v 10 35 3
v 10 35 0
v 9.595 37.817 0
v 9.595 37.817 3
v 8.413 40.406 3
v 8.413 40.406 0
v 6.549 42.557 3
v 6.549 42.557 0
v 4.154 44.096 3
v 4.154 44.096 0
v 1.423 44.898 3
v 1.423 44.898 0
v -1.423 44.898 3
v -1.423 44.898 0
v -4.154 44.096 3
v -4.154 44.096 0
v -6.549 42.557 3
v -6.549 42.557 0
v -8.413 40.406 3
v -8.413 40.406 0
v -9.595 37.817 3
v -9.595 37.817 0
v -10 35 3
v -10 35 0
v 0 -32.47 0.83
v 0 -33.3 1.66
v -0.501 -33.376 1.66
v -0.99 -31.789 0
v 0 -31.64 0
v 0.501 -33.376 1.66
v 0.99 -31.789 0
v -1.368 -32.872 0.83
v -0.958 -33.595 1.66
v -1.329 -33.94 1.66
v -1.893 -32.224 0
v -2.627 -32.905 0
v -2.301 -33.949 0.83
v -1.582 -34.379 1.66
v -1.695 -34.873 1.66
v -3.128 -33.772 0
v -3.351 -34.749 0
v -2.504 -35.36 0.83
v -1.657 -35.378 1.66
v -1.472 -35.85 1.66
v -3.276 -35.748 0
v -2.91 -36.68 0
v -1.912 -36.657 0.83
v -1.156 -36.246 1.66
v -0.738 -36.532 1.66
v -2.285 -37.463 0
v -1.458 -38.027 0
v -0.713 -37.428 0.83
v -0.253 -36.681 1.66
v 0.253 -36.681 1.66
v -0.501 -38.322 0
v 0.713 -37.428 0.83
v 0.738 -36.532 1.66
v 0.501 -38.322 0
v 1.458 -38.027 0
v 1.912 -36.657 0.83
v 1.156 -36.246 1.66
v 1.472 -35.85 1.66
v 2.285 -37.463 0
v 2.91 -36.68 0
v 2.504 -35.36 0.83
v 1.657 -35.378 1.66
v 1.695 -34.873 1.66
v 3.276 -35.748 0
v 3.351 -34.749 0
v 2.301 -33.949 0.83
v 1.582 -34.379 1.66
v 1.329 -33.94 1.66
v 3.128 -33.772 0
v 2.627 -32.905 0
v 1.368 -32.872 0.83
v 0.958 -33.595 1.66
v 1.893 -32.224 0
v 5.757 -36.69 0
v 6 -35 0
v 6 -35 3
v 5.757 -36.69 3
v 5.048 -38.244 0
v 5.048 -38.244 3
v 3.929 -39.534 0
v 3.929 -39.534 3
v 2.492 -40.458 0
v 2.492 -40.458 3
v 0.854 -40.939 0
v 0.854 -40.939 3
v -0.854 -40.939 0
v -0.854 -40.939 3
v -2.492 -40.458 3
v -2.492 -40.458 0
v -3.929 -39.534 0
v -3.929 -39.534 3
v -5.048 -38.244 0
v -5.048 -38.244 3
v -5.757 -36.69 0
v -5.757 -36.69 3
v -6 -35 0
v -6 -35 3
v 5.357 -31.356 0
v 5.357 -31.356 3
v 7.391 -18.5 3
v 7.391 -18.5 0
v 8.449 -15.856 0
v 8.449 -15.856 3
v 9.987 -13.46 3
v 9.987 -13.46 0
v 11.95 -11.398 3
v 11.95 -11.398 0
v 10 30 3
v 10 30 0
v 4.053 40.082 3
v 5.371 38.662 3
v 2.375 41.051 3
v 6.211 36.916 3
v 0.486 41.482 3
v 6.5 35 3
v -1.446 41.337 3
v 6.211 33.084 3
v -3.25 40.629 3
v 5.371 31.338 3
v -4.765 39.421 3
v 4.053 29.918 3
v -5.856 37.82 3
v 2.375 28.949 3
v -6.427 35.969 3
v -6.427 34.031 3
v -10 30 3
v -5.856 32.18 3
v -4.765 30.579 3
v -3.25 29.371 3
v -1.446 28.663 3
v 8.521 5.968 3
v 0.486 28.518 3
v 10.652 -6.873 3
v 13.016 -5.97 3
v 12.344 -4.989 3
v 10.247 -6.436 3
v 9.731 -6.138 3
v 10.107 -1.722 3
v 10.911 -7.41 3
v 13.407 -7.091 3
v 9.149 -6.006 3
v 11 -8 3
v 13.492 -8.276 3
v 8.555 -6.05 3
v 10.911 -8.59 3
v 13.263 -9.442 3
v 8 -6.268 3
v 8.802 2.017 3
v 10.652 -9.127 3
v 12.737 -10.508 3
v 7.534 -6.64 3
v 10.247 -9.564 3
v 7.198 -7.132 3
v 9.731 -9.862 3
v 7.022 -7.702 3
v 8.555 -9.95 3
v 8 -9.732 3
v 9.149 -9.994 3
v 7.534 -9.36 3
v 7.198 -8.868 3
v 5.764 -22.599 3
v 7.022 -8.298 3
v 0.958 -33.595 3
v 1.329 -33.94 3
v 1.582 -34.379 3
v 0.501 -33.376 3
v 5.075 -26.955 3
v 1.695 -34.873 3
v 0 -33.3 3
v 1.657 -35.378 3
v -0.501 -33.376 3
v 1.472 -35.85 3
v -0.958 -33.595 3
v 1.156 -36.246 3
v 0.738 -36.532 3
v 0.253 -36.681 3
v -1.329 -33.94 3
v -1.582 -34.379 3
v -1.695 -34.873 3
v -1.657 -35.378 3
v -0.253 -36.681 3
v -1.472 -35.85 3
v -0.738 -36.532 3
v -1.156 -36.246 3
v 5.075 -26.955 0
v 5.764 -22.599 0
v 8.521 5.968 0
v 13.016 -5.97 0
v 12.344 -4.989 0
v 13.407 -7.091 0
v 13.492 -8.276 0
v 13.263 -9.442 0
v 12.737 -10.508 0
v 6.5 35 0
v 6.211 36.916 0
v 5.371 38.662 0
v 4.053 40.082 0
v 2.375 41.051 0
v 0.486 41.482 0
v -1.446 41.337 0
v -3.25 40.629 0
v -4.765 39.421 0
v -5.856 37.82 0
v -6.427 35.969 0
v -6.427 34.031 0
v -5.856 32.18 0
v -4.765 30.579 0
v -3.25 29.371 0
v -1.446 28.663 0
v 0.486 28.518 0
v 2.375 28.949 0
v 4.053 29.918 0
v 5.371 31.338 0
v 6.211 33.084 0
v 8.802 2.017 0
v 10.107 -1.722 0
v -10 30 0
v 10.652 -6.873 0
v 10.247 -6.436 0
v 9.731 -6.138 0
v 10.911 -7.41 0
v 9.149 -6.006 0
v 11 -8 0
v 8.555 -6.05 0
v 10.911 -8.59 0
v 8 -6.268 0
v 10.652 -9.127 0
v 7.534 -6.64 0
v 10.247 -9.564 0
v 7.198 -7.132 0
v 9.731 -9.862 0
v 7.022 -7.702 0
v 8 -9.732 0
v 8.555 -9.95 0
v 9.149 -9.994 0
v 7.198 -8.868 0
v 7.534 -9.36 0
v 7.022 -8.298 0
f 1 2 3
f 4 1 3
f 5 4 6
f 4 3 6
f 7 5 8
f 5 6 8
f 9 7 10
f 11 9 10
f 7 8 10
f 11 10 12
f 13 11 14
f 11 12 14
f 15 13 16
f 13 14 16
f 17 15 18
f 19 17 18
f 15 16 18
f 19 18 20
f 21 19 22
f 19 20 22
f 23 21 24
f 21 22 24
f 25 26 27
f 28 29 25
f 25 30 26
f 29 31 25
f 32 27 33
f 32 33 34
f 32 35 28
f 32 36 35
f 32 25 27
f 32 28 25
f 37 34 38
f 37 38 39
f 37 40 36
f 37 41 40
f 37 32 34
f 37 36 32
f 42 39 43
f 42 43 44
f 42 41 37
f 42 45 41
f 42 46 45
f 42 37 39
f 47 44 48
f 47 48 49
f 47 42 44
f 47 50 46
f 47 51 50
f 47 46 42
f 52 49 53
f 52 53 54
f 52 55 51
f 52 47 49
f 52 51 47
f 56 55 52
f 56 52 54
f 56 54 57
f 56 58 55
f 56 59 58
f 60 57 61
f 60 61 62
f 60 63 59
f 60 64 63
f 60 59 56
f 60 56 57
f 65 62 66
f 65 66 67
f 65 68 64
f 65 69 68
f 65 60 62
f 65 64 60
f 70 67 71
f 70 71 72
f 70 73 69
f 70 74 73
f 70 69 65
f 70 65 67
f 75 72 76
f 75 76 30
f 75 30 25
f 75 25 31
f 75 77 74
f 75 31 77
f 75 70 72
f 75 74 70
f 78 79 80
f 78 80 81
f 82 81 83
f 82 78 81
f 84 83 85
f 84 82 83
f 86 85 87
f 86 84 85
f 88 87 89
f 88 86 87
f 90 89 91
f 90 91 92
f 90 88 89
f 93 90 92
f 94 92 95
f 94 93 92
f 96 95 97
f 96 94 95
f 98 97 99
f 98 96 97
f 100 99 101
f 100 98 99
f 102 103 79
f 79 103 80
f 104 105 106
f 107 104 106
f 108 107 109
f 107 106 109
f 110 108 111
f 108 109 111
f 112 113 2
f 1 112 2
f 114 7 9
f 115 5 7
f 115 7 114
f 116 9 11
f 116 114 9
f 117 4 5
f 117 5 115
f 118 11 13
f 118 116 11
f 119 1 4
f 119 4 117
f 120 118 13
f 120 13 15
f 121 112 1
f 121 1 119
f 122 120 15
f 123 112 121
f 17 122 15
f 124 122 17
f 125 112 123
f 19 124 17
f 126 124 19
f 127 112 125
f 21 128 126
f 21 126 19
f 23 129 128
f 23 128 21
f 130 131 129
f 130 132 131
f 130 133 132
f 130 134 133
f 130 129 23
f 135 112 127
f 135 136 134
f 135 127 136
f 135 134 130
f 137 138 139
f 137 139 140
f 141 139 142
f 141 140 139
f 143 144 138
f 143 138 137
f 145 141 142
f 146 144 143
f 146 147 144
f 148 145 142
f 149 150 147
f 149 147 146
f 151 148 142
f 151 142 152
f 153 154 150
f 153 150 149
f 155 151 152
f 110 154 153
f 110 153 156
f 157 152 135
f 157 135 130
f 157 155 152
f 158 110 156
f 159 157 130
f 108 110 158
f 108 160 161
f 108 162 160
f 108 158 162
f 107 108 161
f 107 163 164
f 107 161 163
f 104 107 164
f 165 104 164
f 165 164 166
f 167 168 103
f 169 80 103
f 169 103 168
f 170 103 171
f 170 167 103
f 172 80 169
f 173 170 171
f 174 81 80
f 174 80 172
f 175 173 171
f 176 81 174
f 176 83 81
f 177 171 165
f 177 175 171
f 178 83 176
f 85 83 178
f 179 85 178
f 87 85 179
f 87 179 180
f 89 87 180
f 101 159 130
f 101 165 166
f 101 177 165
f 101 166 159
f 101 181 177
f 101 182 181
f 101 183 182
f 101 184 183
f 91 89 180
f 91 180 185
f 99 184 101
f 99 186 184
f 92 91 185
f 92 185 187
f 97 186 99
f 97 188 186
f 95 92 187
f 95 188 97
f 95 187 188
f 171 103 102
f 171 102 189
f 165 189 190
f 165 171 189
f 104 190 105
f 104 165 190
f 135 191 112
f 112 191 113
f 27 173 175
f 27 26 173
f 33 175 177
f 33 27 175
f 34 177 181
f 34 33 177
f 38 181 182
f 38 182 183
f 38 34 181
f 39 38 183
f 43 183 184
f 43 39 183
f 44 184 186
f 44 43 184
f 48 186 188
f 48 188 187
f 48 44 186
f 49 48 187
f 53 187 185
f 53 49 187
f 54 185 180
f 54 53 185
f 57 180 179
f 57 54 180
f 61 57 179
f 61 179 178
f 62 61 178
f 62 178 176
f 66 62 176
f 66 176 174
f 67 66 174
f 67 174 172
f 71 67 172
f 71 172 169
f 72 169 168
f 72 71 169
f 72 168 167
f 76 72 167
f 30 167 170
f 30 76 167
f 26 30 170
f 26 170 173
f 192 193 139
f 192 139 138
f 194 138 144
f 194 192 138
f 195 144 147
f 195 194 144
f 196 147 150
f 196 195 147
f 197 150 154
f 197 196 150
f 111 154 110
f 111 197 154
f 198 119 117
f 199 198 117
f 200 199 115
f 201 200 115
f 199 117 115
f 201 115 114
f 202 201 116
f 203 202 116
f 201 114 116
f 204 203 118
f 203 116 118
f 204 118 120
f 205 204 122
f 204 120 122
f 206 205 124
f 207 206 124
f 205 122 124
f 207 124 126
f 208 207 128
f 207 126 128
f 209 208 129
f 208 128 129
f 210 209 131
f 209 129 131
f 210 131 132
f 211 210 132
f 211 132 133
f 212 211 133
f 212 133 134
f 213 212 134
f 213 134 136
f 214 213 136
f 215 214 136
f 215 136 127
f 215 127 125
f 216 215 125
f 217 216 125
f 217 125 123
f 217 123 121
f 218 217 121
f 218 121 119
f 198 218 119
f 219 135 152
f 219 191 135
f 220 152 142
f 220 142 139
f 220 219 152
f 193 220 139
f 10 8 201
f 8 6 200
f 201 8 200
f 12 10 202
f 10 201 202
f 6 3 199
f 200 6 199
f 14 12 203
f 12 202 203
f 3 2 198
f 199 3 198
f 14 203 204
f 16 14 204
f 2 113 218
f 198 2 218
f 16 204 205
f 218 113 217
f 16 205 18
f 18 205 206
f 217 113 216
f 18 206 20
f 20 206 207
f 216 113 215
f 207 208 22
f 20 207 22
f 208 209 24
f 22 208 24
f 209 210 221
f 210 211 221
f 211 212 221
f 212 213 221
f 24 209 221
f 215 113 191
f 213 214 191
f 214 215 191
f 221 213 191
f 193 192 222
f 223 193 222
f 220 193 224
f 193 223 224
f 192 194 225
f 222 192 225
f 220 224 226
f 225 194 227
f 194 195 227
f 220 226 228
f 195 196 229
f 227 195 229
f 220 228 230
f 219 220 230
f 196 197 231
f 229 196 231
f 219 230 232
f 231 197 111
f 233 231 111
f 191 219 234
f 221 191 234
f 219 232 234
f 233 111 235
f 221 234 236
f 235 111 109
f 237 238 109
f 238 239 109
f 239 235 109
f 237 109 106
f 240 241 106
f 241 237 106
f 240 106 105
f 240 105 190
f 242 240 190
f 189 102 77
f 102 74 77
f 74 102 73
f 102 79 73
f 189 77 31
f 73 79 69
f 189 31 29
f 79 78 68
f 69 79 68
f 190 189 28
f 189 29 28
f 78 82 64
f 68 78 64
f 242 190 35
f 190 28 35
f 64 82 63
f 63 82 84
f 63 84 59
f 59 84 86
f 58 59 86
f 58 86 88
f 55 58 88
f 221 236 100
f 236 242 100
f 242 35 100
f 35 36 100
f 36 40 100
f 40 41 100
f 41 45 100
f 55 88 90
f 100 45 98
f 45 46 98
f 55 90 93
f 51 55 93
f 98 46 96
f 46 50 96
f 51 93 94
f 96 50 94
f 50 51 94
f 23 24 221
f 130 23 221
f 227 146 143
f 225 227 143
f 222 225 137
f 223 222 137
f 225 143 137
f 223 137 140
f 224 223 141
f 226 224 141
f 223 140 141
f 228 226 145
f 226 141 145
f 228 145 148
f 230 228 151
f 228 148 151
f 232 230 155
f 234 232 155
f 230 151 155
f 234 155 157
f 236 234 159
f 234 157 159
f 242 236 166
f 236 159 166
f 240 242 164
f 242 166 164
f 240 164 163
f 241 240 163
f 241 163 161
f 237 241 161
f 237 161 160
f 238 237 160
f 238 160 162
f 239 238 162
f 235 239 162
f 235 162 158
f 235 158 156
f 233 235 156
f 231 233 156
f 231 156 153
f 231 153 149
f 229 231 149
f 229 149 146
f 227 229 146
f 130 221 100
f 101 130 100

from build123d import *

# Parameters (mm, degrees)
EXTRUDE_1_DEPTH     = 3
SKETCH_2_R          = 6.5
CUT_EXTRUDE_1_DEPTH = 47.19523785
CUT_EXTRUDE_3_DEPTH = 3.5
SKETCH_4_3_R        = 6
EXTRUDE_3_DEPTH     = 3
SKETCH_5_R          = 1.5
CUT_EXTRUDE_4_DEPTH = 47.19523785
SKETCH_6_R          = 4.5
EXTRUDE_4_DEPTH     = 3
FILLET_1_R          = 15
SKETCH_8_R          = 2
CUT_EXTRUDE_5_DEPTH = 48.077064479
CUT_EXTRUDE_9_DEPTH = 48.077064479
FILLET_3_R          = 20


with BuildPart() as part:
    # 草图1 → 凸台-拉伸1 (new body)
    with BuildSketch(Plane.XY):
        with BuildLine():
            ThreePointArc((10, 35), (0, 45), (-10, 35))
            Line((-10, 35), (10, 35))
        make_face()
        with BuildLine():
            Line((10, 35), (-10, 35))
            ThreePointArc((-10, 35), (0, 25), (10, 35))
        make_face()
        with BuildLine():
            ThreePointArc((10, 35), (0, 25), (-10, 35))
            Line((-10, 35), (-10, -35))
            Line((-10, -35), (10, -35))
            Line((10, -35), (10, 35))
        make_face()
    extrude(amount=EXTRUDE_1_DEPTH)

    # 草图2 → 切除-拉伸1 (cut, through all)
    with BuildSketch(Plane.XY.offset(3)):
        with Locations((0, 35)):
            Circle(SKETCH_2_R)
    extrude(amount=-CUT_EXTRUDE_1_DEPTH, mode=Mode.SUBTRACT)

    # 草图4 → 切除-拉伸3 (cut)
    with BuildSketch(Plane(origin=(0, 0, 0), x_dir=(-1, 0, 0), z_dir=(0, 0, -1))):
        Polygon((10, 30), (6, -35), (10, -35), align=None)
        Polygon((-10, -35), (-6, -35), (-10, 30), align=None)
    extrude(amount=-CUT_EXTRUDE_3_DEPTH, mode=Mode.SUBTRACT)

    # 草图4<3> → 凸台-拉伸3 (add)
    with BuildSketch(Plane(origin=(0, 0, 0), x_dir=(-1, 0, 0), z_dir=(0, 0, -1))):
        with Locations((0, -35)):
            Circle(SKETCH_4_3_R)
    extrude(amount=-EXTRUDE_3_DEPTH)

    # 草图5 → 切除-拉伸4 (cut, through all)
    with BuildSketch(Plane(origin=(0, 0, 0), x_dir=(-1, 0, 0), z_dir=(0, 0, -1))):
        with Locations((0, -35)):
            Circle(SKETCH_5_R)
    extrude(amount=-CUT_EXTRUDE_4_DEPTH, mode=Mode.SUBTRACT)

    # 草图6 → 凸台-拉伸4 (add)
    with BuildSketch(Plane(origin=(0, 0, 0), x_dir=(-1, 0, 0), z_dir=(0, 0, -1))):
        with Locations((-9, -8)):
            Circle(SKETCH_6_R)
    extrude(amount=-EXTRUDE_4_DEPTH)

    # 圆角1
    fillet_1_edges = [part.edges().sort_by_distance(p)[0] for p in [
        (7.930527209, -3.628932859, 1.5),
        (7.402648929, -12.206954903, 1.5),
    ]]
    fillet(fillet_1_edges, radius=FILLET_1_R)

    # 草图8 → 切除-拉伸5 (cut, through all)
    with BuildSketch(Plane.XY.offset(3)):
        with Locations((9, -8)):
            Circle(SKETCH_8_R)
    extrude(amount=-CUT_EXTRUDE_5_DEPTH, mode=Mode.SUBTRACT)

    # 草图11 → 切除-拉伸9 (cut, through all)
    with BuildSketch(Plane.XY.offset(3)):
        with BuildLine():
            Line((3.090604818, -18.5), (6, -35))
            Line((6, -35), (6.812082422, -21.803660643))
            ThreePointArc((6.812082422, -21.803660643), (7.00895024, -20.135596552), (7.391074134, -18.5))
            Line((7.391074134, -18.5), (3.090604818, -18.5))
        make_face()
    extrude(amount=-CUT_EXTRUDE_9_DEPTH, mode=Mode.SUBTRACT)

    # 圆角3
    # the kernel refuses this fillet: 20 mm, written as the material it adds along each edge
    with BuildSketch(Plane(origin=(3.090604818, -18.5, 3), x_dir=(1, 0, 0), z_dir=(0, 0, -1))) as fillet_3_piece_1:
        with BuildLine():
            CenterArc((21.962966165, 9.382761056), FILLET_3_R, 170, 37.978360215)
            Line((2.266811105, 12.85572461), (1.872888004, 12.925183881))
            Line((1.872888004, 12.925183881), (-0.393923101, 0.069459271))
            Line((-0.393923101, 0.069459271), (0, -0.4))
            ThreePointArc((0, -0.4), (2.150234658, -0.4), (3.947219379, -0.187655221))
            Line((3.947219379, -0.187655221), (4.300469316, 0))
        make_face()
    extrude(amount=3)

    # 草图14 → M3 六角凹锥坑螺钉的锥形沉头孔2 (revolve, cut)
    with BuildSketch(Plane(origin=(0, -35, 0), x_dir=(0, 1, 0), z_dir=(1, 0, 0))):
        Polygon((0, 0), (0, 3), (1.7, 3), (1.7, 1.66), (3.36, 0), align=None)
    revolve(axis=Axis((0, -35, -6.35), (0, 0, 1)), mode=Mode.SUBTRACT)


solid = part.part
